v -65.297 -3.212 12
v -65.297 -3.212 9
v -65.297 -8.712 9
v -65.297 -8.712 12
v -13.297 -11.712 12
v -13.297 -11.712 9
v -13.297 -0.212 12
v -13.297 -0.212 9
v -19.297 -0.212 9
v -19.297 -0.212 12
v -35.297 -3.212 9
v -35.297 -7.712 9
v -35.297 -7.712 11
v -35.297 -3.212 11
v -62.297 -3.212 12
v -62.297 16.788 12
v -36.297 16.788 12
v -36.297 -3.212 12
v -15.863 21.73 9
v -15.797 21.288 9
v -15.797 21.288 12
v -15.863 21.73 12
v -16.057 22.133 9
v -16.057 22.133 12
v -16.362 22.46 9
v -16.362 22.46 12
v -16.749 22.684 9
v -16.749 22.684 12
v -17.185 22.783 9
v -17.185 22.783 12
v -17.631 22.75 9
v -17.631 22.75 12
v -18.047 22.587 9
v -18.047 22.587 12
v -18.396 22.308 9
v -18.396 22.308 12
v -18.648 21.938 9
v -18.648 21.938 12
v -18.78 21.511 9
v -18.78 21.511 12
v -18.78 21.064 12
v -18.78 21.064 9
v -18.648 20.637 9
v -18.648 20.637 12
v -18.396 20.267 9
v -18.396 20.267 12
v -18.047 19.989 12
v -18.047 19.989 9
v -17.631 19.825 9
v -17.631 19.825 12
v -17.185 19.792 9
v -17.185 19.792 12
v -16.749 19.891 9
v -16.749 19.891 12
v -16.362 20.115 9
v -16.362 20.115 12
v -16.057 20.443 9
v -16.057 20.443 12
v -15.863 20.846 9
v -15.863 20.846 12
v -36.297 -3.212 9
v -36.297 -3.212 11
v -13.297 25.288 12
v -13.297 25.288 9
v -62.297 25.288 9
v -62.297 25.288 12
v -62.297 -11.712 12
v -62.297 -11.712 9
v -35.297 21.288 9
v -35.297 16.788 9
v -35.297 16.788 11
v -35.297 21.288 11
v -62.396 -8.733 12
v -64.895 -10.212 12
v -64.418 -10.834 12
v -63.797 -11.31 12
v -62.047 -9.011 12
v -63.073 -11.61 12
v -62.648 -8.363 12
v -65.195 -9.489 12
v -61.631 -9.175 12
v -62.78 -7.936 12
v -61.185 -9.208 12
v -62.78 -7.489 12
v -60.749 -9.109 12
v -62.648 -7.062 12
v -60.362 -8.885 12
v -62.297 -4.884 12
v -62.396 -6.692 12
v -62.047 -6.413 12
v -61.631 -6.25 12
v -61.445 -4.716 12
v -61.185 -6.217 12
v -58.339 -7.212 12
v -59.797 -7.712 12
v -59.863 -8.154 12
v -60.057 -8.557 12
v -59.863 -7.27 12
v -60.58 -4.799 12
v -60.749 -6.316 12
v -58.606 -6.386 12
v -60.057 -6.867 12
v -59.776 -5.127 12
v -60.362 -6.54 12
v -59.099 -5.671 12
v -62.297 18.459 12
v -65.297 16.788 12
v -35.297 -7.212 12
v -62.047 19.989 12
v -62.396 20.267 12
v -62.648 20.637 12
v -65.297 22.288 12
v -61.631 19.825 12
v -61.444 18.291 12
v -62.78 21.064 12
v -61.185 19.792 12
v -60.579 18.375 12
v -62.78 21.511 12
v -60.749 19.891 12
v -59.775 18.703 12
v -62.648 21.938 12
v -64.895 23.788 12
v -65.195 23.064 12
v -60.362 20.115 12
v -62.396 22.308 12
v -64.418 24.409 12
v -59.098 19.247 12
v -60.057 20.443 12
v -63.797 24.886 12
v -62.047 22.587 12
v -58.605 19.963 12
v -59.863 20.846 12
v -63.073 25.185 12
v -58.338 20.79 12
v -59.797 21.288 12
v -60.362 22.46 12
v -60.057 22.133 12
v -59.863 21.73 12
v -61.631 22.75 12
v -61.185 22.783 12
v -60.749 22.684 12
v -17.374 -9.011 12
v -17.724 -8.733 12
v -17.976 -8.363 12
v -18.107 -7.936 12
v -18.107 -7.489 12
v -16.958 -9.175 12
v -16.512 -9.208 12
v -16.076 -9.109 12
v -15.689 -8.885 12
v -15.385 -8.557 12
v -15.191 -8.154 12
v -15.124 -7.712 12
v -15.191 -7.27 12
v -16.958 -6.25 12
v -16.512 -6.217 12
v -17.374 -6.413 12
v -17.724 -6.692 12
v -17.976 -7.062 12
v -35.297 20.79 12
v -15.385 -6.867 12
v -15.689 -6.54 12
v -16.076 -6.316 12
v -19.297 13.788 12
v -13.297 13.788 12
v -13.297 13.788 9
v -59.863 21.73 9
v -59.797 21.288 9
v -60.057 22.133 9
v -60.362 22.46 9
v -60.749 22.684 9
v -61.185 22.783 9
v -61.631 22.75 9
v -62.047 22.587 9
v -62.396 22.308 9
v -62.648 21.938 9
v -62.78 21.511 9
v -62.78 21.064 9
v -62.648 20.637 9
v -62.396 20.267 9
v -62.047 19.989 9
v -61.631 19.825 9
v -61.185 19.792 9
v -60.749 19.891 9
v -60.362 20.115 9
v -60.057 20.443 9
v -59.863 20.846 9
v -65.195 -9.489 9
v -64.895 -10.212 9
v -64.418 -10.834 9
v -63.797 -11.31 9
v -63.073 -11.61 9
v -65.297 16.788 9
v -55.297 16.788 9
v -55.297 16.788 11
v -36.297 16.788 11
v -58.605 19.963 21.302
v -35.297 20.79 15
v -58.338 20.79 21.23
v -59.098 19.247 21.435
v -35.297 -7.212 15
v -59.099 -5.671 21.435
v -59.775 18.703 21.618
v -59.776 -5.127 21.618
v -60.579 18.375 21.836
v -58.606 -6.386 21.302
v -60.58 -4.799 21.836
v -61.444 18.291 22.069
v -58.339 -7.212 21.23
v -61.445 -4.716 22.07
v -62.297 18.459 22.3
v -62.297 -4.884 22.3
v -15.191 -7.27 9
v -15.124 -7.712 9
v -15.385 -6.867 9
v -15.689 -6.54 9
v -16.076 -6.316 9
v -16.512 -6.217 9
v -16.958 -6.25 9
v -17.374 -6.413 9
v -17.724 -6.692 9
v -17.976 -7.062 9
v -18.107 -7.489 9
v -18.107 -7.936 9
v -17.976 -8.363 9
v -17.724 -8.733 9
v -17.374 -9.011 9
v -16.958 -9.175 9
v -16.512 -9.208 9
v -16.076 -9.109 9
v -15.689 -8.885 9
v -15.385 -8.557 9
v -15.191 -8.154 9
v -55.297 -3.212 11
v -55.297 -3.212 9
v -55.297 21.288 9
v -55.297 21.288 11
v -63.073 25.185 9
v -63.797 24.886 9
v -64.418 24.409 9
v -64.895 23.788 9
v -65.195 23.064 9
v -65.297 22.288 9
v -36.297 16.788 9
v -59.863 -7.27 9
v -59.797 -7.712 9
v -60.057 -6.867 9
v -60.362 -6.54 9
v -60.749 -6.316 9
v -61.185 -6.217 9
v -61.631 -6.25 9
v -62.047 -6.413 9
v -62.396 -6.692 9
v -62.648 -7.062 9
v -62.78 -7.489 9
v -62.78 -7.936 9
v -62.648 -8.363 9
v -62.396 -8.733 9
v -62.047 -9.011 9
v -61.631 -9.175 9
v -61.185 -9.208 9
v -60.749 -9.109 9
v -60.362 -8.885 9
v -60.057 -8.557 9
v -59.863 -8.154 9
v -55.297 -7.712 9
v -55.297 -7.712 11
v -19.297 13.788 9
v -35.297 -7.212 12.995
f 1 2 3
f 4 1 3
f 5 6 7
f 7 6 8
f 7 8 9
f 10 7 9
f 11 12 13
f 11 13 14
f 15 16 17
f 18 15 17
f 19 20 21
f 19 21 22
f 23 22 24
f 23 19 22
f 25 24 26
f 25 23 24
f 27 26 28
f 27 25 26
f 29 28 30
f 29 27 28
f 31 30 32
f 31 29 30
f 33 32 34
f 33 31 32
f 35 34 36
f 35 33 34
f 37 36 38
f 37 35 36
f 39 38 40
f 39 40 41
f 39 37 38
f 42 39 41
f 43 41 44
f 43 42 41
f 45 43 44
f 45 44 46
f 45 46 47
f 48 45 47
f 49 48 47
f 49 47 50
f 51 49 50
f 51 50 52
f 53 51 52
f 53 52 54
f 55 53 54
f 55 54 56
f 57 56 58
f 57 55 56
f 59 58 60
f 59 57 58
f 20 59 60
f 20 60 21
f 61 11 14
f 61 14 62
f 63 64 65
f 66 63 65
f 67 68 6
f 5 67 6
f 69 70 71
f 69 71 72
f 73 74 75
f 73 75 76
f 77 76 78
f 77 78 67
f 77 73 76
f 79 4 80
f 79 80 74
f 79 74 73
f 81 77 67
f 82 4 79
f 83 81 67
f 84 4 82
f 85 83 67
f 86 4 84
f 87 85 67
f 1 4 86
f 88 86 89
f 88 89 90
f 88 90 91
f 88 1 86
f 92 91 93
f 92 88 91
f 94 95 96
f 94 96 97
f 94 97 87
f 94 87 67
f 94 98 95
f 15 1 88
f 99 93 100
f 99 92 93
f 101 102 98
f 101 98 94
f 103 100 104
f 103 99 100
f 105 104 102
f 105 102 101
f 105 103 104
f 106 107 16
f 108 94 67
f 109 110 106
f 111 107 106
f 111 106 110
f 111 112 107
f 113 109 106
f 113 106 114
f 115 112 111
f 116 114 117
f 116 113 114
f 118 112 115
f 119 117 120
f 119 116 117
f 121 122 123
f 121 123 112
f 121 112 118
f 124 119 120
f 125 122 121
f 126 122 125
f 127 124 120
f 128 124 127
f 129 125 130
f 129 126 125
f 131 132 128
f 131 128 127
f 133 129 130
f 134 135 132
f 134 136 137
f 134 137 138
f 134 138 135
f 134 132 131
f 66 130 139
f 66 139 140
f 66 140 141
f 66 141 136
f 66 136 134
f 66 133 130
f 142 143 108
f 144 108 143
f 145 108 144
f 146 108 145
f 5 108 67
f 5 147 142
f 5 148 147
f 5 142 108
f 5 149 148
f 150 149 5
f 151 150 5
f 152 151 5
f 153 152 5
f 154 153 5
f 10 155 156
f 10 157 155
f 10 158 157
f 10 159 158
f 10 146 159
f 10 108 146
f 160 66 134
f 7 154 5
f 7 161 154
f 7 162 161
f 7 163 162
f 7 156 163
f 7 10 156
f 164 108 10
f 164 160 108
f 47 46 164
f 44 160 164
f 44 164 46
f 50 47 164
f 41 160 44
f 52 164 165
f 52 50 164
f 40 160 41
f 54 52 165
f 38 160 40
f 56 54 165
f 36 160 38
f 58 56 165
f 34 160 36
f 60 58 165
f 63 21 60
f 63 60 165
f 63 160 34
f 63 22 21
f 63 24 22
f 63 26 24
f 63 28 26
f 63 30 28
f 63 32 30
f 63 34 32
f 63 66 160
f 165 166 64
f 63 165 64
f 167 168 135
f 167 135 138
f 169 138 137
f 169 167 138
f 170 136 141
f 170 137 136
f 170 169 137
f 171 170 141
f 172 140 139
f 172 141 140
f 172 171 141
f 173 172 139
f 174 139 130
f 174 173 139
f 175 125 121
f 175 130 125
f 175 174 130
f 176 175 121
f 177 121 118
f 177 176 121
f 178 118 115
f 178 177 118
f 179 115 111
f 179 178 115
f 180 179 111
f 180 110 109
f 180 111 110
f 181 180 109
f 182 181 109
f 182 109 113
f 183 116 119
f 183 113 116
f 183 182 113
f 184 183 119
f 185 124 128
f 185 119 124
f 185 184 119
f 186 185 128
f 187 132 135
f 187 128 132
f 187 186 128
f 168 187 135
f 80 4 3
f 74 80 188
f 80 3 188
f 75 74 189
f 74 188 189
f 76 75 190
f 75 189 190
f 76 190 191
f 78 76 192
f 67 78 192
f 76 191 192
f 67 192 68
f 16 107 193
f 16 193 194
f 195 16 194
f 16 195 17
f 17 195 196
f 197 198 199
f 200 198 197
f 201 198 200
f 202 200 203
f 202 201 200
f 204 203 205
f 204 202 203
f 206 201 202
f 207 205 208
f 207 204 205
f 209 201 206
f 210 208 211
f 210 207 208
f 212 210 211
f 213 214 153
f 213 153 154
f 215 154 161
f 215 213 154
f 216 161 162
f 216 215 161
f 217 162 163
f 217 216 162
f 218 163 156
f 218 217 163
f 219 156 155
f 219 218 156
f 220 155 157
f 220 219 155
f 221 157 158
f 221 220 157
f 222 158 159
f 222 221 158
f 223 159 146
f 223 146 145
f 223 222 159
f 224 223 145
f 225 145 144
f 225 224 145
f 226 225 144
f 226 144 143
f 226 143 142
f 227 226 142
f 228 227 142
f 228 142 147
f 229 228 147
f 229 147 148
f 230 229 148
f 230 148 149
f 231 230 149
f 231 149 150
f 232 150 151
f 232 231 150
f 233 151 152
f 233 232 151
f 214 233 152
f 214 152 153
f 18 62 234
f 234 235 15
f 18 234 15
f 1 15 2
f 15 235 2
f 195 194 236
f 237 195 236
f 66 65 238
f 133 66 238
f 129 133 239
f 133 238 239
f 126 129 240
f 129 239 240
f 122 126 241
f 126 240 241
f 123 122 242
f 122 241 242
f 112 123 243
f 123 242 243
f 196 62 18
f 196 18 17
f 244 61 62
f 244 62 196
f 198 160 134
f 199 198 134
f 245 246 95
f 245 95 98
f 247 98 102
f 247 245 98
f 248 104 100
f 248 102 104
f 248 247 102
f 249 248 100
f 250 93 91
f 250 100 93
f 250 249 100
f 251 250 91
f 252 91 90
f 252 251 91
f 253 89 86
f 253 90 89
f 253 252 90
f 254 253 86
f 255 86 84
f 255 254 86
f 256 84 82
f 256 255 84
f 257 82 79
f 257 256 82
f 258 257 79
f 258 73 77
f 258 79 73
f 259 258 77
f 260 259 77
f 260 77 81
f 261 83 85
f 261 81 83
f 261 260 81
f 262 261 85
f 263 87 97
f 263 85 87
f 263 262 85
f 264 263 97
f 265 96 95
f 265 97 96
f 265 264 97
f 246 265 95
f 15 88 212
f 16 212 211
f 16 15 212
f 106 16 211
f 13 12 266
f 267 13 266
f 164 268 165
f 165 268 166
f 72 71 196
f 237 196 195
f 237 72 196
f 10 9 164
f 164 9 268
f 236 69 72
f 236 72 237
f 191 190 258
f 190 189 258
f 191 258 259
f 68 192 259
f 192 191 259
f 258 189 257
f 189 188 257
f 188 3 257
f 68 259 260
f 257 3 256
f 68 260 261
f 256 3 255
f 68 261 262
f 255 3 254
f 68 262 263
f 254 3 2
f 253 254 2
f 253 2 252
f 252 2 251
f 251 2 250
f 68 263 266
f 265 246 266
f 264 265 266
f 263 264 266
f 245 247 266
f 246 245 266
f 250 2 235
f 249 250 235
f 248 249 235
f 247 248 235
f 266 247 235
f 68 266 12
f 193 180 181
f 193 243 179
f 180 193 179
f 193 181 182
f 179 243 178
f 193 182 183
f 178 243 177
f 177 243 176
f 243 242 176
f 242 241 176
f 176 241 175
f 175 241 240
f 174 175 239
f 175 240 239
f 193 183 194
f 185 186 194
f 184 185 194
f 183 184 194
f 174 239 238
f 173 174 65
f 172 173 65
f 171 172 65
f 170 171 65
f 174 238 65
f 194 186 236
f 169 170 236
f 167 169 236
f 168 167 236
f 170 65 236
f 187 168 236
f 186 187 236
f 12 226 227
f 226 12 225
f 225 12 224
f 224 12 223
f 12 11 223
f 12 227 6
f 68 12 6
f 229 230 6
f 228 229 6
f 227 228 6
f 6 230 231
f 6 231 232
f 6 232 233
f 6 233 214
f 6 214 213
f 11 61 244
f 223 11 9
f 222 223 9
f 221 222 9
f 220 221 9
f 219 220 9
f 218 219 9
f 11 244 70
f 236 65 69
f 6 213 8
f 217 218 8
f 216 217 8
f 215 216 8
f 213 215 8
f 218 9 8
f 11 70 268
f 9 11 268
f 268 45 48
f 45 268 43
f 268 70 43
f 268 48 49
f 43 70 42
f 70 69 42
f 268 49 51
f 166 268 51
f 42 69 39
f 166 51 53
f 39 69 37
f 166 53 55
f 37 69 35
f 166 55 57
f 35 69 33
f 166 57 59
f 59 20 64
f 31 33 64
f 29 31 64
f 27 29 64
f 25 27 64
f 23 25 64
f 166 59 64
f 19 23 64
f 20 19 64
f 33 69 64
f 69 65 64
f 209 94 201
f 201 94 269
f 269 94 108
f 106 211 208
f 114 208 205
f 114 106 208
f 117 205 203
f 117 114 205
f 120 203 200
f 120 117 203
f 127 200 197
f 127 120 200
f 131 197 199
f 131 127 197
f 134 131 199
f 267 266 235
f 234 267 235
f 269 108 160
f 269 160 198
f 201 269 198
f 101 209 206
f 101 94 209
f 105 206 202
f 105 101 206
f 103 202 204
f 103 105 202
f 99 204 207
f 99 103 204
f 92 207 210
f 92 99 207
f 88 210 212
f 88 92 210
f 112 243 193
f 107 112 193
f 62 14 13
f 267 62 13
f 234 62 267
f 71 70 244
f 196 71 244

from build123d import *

# Parameters (mm, degrees)
CROQUIS1_W              = 52
CROQUIS1_H              = 37
SALIENTE_EXTRUIR1_DEPTH = 3
REDONDEO1_R             = 3
CROQUIS2_R              = 1.5
CORTAR_EXTRUIR1_DEPTH   = 3
CROQUIS3_W              = 29
CROQUIS3_H              = 20
CROQUIS3_W_2            = 6
CROQUIS3_H_2            = 14
CORTAR_EXTRUIR2_DEPTH   = 3
SALIENTE_EXTRUIR2_DEPTH = 9
CROQUIS5_W              = 36
CROQUIS5_H              = 28.002550662
SALIENTE_EXTRUIR3_DEPTH = 10.3
CORTAR_EXTRUIR3_START   = -28.002551
CORTAR_EXTRUIR3_DEPTH   = 28.002551
SALIENTE_EXTRUIR4_DEPTH = 8.5
CROQUIS8_W              = 21.9
CROQUIS8_H              = 60.9
CORTAR_EXTRUIR4_DEPTH   = 5.5
CORTAR_EXTRUIR5_DEPTH   = 9
CORTAR_EXTRUIR6_START   = -28.002551
CROQUIS12_W             = 9
CROQUIS12_H             = 1.570892211
CORTAR_EXTRUIR6_DEPTH   = 28.002551
CROQUIS13_W             = 3
CROQUIS13_H             = 67
SALIENTE_EXTRUIR5_DEPTH = 12
CORTAR_EXTRUIR7_START   = -28.002551
CROQUIS14_W             = 31
CROQUIS14_H             = 9
CORTAR_EXTRUIR7_DEPTH   = 28.002551
CROQUIS17_R             = 1.5
SALIENTE_EXTRUIR6_DEPTH = 9
CORTAR_EXTRUIR8_START   = -37
CROQUIS18_W             = 54.197150846
CROQUIS18_H             = 9
CORTAR_EXTRUIR8_DEPTH   = 37
CORTAR_EXTRUIR9_REACH   = 83.194
CROQUIS19_R             = 1.5
CROQUIS20_W             = 28
CROQUIS20_H             = 6
SALIENTE_EXTRUIR7_DEPTH = 3
CROQUIS21_W             = 20
CROQUIS21_H             = 4.5
CORTAR_EXTRUIR10_DEPTH  = 2
CROQUIS22_R             = 3
CORTAR_EXTRUIR11_DEPTH  = 10.3
CORTAR_EXTRUIR12_REACH  = 82.263
CROQUIS23_R             = 2
CORTAR_EXTRUIR13_START  = -20.5
CROQUIS24_W             = 31.641373031
CROQUIS24_H             = 75.620640488
CORTAR_EXTRUIR13_DEPTH  = 20.5
CROQUIS25_W             = 28
CROQUIS25_H             = 6
CORTAR_EXTRUIR14_DEPTH  = 10
SALIENTE_EXTRUIR8_DEPTH = 9
CORTAR_EXTRUIR16_REACH  = 72.776
CROQUIS30_R             = 3


with BuildPart() as part:
    # Croquis1 → Saliente-Extruir1 (new body)
    with BuildSketch(Plane.XY):
        with Locations((-39.296803653, 6.787671233)):
            Rectangle(CROQUIS1_W, CROQUIS1_H)
    extrude(amount=SALIENTE_EXTRUIR1_DEPTH)

    # Redondeo1
    redondeo1_edges = [part.edges().sort_by_distance(p)[0] for p in [
        (-65.296803653, 25.287671233, 1.5),
        (-65.296803653, -11.712328767, 1.5),
    ]]
    fillet(redondeo1_edges, radius=REDONDEO1_R)

    # Croquis2 → Cortar-Extruir1 (cut)
    with BuildSketch(Plane.XY.offset(3)):
        with Locations((-61.296803653, 21.287671233)):
            Circle(CROQUIS2_R)
        with Locations((-61.296803653, -7.712328767)):
            Circle(CROQUIS2_R)
        with Locations((-16.624072342, -7.712328767)):
            Circle(CROQUIS2_R)
        with Locations((-17.296803653, 21.287671233)):
            Circle(CROQUIS2_R)
    extrude(amount=-CORTAR_EXTRUIR1_DEPTH, mode=Mode.SUBTRACT)

    # Croquis3 → Cortar-Extruir2 (cut)
    with BuildSketch(Plane.XY.offset(3)):
        with Locations((-50.796803653, 6.787671233)):
            Rectangle(CROQUIS3_W, CROQUIS3_H)
        with Locations((-16.296803653, 6.787671233)):
            Rectangle(CROQUIS3_W_2, CROQUIS3_H_2)
    extrude(amount=-CORTAR_EXTRUIR2_DEPTH, mode=Mode.SUBTRACT)

    # Croquis4 → Saliente-Extruir2 (add)
    with BuildSketch(Plane.XY.offset(3)):
        Polygon((-57.296803653, 16.787671233), (-57.296803653, 20.790221895), (-26.296803653, 20.790221895), (-26.296803653, -7.212328767), (-57.296803653, -7.212328767), (-57.296803653, -3.212328767), (-36.296803653, -3.212328767), (-36.296803653, 16.787671233), align=None)
    extrude(amount=SALIENTE_EXTRUIR2_DEPTH)

    # Croquis5 → Saliente-Extruir3 (add)
    with BuildSketch(Plane.XY.offset(12)):
        with Locations((-44.296803653, 6.788946564)):
            Rectangle(CROQUIS5_W, CROQUIS5_H)
    extrude(amount=SALIENTE_EXTRUIR3_DEPTH)

    # Croquis6 → Cortar-Extruir3 (cut)
    with BuildSketch(Plane.XZ.offset(7.212328767).offset(CORTAR_EXTRUIR3_START)):
        Polygon((-35.296803653, 15), (-35.296803653, 12.995381041), (-26.296803653, 12.995381041), (-26.296803653, 14.757444162), (-26.296803653, 22.3), (-62.296803653, 22.3), align=None)
    extrude(amount=CORTAR_EXTRUIR3_DEPTH, mode=Mode.SUBTRACT)

    # Croquis7 → Saliente-Extruir4 (add)
    with BuildSketch(Plane(origin=(1.374852463, 0, 5.085070754), x_dir=(0.9653390502996949, 0, -0.2609990765625102), z_dir=(0.2609990765625102, 0, 0.9653390502996949))):
        Polygon((-65.957816682, 6.788946564), (-65.957816682, -26.711053436), (-37.957816682, -26.711053436), (-37.957816682, 40.288946564), (-65.957816682, 40.288946564), align=None)
    extrude(amount=SALIENTE_EXTRUIR4_DEPTH)

    # Croquis8 → Cortar-Extruir4 (cut)
    with BuildSketch(Plane(origin=(3.593344614, 0, 13.290452681), x_dir=(0.9653390502996949, 0, -0.26099907656251026), z_dir=(0.26099907656251026, 0, 0.9653390502996949))):
        with Locations((-51.957816682, 6.788946564)):
            Rectangle(CROQUIS8_W, CROQUIS8_H)
    extrude(amount=-CORTAR_EXTRUIR4_DEPTH, mode=Mode.SUBTRACT)

    # Croquis10 → Cortar-Extruir5 (cut)
    with BuildSketch(Plane(origin=(0, 20.790221895, 0), x_dir=(1, 0, 0), z_dir=(0, 1, 0))):
        Polygon((-62.296803653, -22.3), (-35.296803653, -15), (-35.296803653, -12), (-62.296803653, -19.3), align=None)
    extrude(amount=-CORTAR_EXTRUIR5_DEPTH, mode=Mode.SUBTRACT)

    # Croquis12 → Cortar-Extruir6 (cut)
    with BuildSketch(Plane(origin=(0, 20.790221895, 0), x_dir=(1, 0, 0), z_dir=(0, 1, 0)).offset(CORTAR_EXTRUIR6_START)):
        with Locations((-30.796803653, -12.209934936)):
            Rectangle(CROQUIS12_W, CROQUIS12_H)
    extrude(amount=CORTAR_EXTRUIR6_DEPTH, mode=Mode.SUBTRACT)

    # Croquis13 → Saliente-Extruir5 (add)
    with BuildSketch(Plane(origin=(3.593344614, 0, 13.290452681), x_dir=(0.9653390502996949, 0, -0.26099907656251026), z_dir=(0.26099907656251026, 0, 0.9653390502996949))):
        with Locations((-39.457816682, 6.788946564)):
            Rectangle(CROQUIS13_W, CROQUIS13_H)
    extrude(amount=SALIENTE_EXTRUIR5_DEPTH)

    # Croquis14 → Cortar-Extruir7 (cut)
    with BuildSketch(Plane.XZ.offset(7.212328767).offset(CORTAR_EXTRUIR7_START)):
        with Locations((-41.796803653, 7.5)):
            Rectangle(CROQUIS14_W, CROQUIS14_H)
    extrude(amount=CORTAR_EXTRUIR7_DEPTH, mode=Mode.SUBTRACT)


with BuildPart() as cortar_extruir7_piece_1:
    # of the separate pieces the step leaves, piece 1, a body of its own (cortar_extruir7_pieces)
    add(part.part.solids().sort_by_distance((-62.296803653, -26.711053436, 22.3))[0])



with BuildPart() as cortar_extruir7_piece_2:
    # of the separate pieces the step leaves, piece 2, a body of its own (cortar_extruir7_pieces)
    add(part.part.solids().sort_by_distance((-62.296803653, 25.287671233, 3))[0])


with BuildPart() as cortar_extruir7_piece_1_1:
    add(cortar_extruir7_piece_1.part)

    add(cortar_extruir7_piece_2.part)  # Saliente-Extruir6 merges Cortar-Extruir7 piece 2
    # Croquis17 → Saliente-Extruir6 (add)
    with BuildSketch(Plane.XY.offset(3)):
        with BuildLine():
            Line((-13.296803653, -0.212328767), (-19.296803653, -0.212328767))
            Line((-19.296803653, -0.212328767), (-19.296803653, 13.787671233))
            Line((-19.296803653, 13.787671233), (-13.296803653, 13.787671233))
            Line((-13.296803653, 13.787671233), (-13.296803653, 25.287671233))
            Line((-13.296803653, 25.287671233), (-62.296803653, 25.287671233))
            ThreePointArc((-62.296803653, 25.287671233), (-64.418123997, 24.408991576), (-65.296803653, 22.287671233))
            Line((-65.296803653, 22.287671233), (-65.296803653, 16.787671233))
            Line((-65.296803653, 16.787671233), (-36.296803653, 16.787671233))
            Line((-36.296803653, 16.787671233), (-36.296803653, -3.212328767))
            Line((-36.296803653, -3.212328767), (-65.296803653, -3.212328767))
            Line((-65.296803653, -3.212328767), (-65.296803653, -8.712328767))
            ThreePointArc((-65.296803653, -8.712328767), (-64.418123997, -10.833649111), (-62.296803653, -11.712328767))
            Line((-62.296803653, -11.712328767), (-13.296803653, -11.712328767))
            Line((-13.296803653, -11.712328767), (-13.296803653, -0.212328767))
        make_face()
        with Locations((-61.296803653, 21.287671233)):
            Circle(CROQUIS17_R, mode=Mode.SUBTRACT)
        with Locations((-61.296803653, -7.712328767)):
            Circle(CROQUIS17_R, mode=Mode.SUBTRACT)
        with Locations((-16.624072342, -7.712328767)):
            Circle(CROQUIS17_R, mode=Mode.SUBTRACT)
        with Locations((-17.296803653, 21.287671233)):
            Circle(CROQUIS17_R, mode=Mode.SUBTRACT)
    extrude(amount=SALIENTE_EXTRUIR6_DEPTH)

    # Croquis18 → Cortar-Extruir8 (cut)
    with BuildSketch(Plane.XZ.offset(11.712328767).offset(CORTAR_EXTRUIR8_START)):
        with Locations((-40.395379076, 4.5)):
            Rectangle(CROQUIS18_W, CROQUIS18_H)
    extrude(amount=CORTAR_EXTRUIR8_DEPTH, mode=Mode.SUBTRACT)

    # Cortar-Extruir9: up to this plane
    cortar_extruir9_end = Plane(origin=(3.593344614, 0, 13.290452681), z_dir=(0.26099907656251026, 0, 0.9653390502996949))
    # Croquis19 → Cortar-Extruir9 (cut, up to the surface)
    with BuildSketch(Plane(origin=(0, 0, 9), x_dir=(-1, 0, 0), z_dir=(0, 0, -1)), mode=Mode.PRIVATE) as cortar_extruir9_sk1:
        with Locations(Location((61.296803653, 21.287671233, 0), (0, 0, 180))):
            Circle(CROQUIS19_R)
    cortar_extruir9_tool1 = split(extrude(cortar_extruir9_sk1.sketch, amount=-CORTAR_EXTRUIR9_REACH, mode=Mode.PRIVATE), bisect_by=cortar_extruir9_end, keep=Keep.BOTH, mode=Mode.PRIVATE)
    add(cortar_extruir9_tool1.solids().sort_by_distance((-61.296804, 21.287671, 9))[0], mode=Mode.SUBTRACT)
    # Croquis19 → Cortar-Extruir9 (cut, up to the surface)
    with BuildSketch(Plane(origin=(0, 0, 9), x_dir=(-1, 0, 0), z_dir=(0, 0, -1)), mode=Mode.PRIVATE) as cortar_extruir9_sk2:
        with Locations(Location((61.296803653, -7.712328767, 0), (0, 0, 180))):
            Circle(CROQUIS19_R)
    cortar_extruir9_tool2 = split(extrude(cortar_extruir9_sk2.sketch, amount=-CORTAR_EXTRUIR9_REACH, mode=Mode.PRIVATE), bisect_by=cortar_extruir9_end, keep=Keep.BOTH, mode=Mode.PRIVATE)
    add(cortar_extruir9_tool2.solids().sort_by_distance((-61.296804, -7.712329, 9))[0], mode=Mode.SUBTRACT)

    # Croquis20 → Saliente-Extruir7 (add)
    with BuildSketch(Plane(origin=(1.374852463, 0, 5.085070754), x_dir=(-0.9653390502996949, 0, 0.26099907656251026), z_dir=(-0.26099907656251026, 0, -0.9653390502996949))):
        with Locations((51.957816682, 37.288946564)):
            Rectangle(CROQUIS20_W, CROQUIS20_H)
    extrude(amount=SALIENTE_EXTRUIR7_DEPTH)

    # Croquis21 → Cortar-Extruir10 (cut)
    with BuildSketch(Plane(origin=(0, 0, 9), x_dir=(-1, 0, 0), z_dir=(0, 0, -1))):
        with Locations((45.296803653, 19.037671233)):
            Rectangle(CROQUIS21_W, CROQUIS21_H)
        with Locations((45.296803653, -5.462328767)):
            Rectangle(CROQUIS21_W, CROQUIS21_H)
    extrude(amount=-CORTAR_EXTRUIR10_DEPTH, mode=Mode.SUBTRACT)

    # Croquis22 → Cortar-Extruir11 (cut)
    with BuildSketch(Plane.XY.offset(12)):
        with Locations((-61.296803653, 21.287671233)):
            Circle(CROQUIS22_R)
        with Locations((-61.296803653, -7.712328767)):
            Circle(CROQUIS22_R)
    extrude(amount=CORTAR_EXTRUIR11_DEPTH, mode=Mode.SUBTRACT)

    # Cortar-Extruir12: up to this plane
    cortar_extruir12_end = Plane(origin=(3.593344614, 0, 13.290452681), z_dir=(0.26099907656251026, 0, 0.9653390502996949))
    # Croquis23 → Cortar-Extruir12 (cut, up to the surface)
    with BuildSketch(Plane.XY.offset(12), mode=Mode.PRIVATE) as cortar_extruir12_sk1:
        with Locations((-61.296803653, 21.287671233)):
            Circle(CROQUIS23_R)
    cortar_extruir12_tool1 = split(extrude(cortar_extruir12_sk1.sketch, amount=CORTAR_EXTRUIR12_REACH, mode=Mode.PRIVATE), bisect_by=cortar_extruir12_end, keep=Keep.BOTH, mode=Mode.PRIVATE)
    add(cortar_extruir12_tool1.solids().sort_by_distance((-61.296804, 21.287671, 12))[0], mode=Mode.SUBTRACT)
    # Croquis23 → Cortar-Extruir12 (cut, up to the surface)
    with BuildSketch(Plane.XY.offset(12), mode=Mode.PRIVATE) as cortar_extruir12_sk2:
        with Locations((-61.296803653, -7.712328767)):
            Circle(CROQUIS23_R)
    cortar_extruir12_tool2 = split(extrude(cortar_extruir12_sk2.sketch, amount=CORTAR_EXTRUIR12_REACH, mode=Mode.PRIVATE), bisect_by=cortar_extruir12_end, keep=Keep.BOTH, mode=Mode.PRIVATE)
    add(cortar_extruir12_tool2.solids().sort_by_distance((-61.296804, -7.712329, 12))[0], mode=Mode.SUBTRACT)

    # Croquis24 → Cortar-Extruir13 (cut)
    with BuildSketch(Plane(origin=(1.374852463, 0, 5.085070754), x_dir=(-0.9653390502996949, 0, 0.26099907656251026), z_dir=(-0.26099907656251026, 0, -0.9653390502996949)).offset(CORTAR_EXTRUIR13_START)):
        with Locations((53.778503198, 11.099266808)):
            Rectangle(CROQUIS24_W, CROQUIS24_H)
    extrude(amount=CORTAR_EXTRUIR13_DEPTH, mode=Mode.SUBTRACT)


with BuildPart() as cortar_extruir13_piece_1:
    # of the separate pieces the step leaves, piece 1, a body of its own (cortar_extruir13_pieces)
    add(cortar_extruir7_piece_1_1.part.solids().sort_by_distance((-59.796803653, 21.287671233, 12))[0])

    # Croquis27 → Saliente-Extruir8 (add)
    with BuildSketch(Plane(origin=(0, 11.790221895, 0), x_dir=(1, 0, 0), z_dir=(0, 1, 0))):
        Polygon((-35.296803653, -12), (-35.296803653, -15), (-62.296803653, -22.3), (-62.296803653, -19.3), align=None)
    extrude(amount=SALIENTE_EXTRUIR8_DEPTH)

    # Cortar-Extruir16: up to this plane
    cortar_extruir16_end = Plane(origin=(1.374852463, 0, 5.085070754), z_dir=(0.2609990765625103, 0, 0.965339050299695))
    # Croquis30 → Cortar-Extruir16 (cut, up to the surface)
    with BuildSketch(Plane.XY.offset(12), mode=Mode.PRIVATE) as cortar_extruir16_sk1:
        with Locations((-61.296803653, 21.287671233)):
            Circle(CROQUIS30_R)
    cortar_extruir16_tool1 = split(extrude(cortar_extruir16_sk1.sketch, amount=CORTAR_EXTRUIR16_REACH, mode=Mode.PRIVATE), bisect_by=cortar_extruir16_end, keep=Keep.BOTH, mode=Mode.PRIVATE)
    add(cortar_extruir16_tool1.solids().sort_by_distance((-61.296804, 21.287671, 12))[0], mode=Mode.SUBTRACT)


with BuildPart() as cortar_extruir13_piece_2:
    # of the separate pieces the step leaves, piece 2, a body of its own (cortar_extruir13_pieces)
    add(cortar_extruir7_piece_1_1.part.solids().sort_by_distance((-35.267310245, 34.288946564, 14.992025856))[0])

    # Croquis25 → Cortar-Extruir14 (cut)
    with BuildSketch(Plane(origin=(0.591855233, 0, 2.189053603), x_dir=(-0.9653390502996949, 0, 0.26099907656251037), z_dir=(-0.26099907656251037, 0, -0.9653390502996949))):
        with Locations((51.957816682, 37.288946564)):
            Rectangle(CROQUIS25_W, CROQUIS25_H)
    extrude(amount=-CORTAR_EXTRUIR14_DEPTH, mode=Mode.SUBTRACT)


solid = cortar_extruir13_piece_1.part
